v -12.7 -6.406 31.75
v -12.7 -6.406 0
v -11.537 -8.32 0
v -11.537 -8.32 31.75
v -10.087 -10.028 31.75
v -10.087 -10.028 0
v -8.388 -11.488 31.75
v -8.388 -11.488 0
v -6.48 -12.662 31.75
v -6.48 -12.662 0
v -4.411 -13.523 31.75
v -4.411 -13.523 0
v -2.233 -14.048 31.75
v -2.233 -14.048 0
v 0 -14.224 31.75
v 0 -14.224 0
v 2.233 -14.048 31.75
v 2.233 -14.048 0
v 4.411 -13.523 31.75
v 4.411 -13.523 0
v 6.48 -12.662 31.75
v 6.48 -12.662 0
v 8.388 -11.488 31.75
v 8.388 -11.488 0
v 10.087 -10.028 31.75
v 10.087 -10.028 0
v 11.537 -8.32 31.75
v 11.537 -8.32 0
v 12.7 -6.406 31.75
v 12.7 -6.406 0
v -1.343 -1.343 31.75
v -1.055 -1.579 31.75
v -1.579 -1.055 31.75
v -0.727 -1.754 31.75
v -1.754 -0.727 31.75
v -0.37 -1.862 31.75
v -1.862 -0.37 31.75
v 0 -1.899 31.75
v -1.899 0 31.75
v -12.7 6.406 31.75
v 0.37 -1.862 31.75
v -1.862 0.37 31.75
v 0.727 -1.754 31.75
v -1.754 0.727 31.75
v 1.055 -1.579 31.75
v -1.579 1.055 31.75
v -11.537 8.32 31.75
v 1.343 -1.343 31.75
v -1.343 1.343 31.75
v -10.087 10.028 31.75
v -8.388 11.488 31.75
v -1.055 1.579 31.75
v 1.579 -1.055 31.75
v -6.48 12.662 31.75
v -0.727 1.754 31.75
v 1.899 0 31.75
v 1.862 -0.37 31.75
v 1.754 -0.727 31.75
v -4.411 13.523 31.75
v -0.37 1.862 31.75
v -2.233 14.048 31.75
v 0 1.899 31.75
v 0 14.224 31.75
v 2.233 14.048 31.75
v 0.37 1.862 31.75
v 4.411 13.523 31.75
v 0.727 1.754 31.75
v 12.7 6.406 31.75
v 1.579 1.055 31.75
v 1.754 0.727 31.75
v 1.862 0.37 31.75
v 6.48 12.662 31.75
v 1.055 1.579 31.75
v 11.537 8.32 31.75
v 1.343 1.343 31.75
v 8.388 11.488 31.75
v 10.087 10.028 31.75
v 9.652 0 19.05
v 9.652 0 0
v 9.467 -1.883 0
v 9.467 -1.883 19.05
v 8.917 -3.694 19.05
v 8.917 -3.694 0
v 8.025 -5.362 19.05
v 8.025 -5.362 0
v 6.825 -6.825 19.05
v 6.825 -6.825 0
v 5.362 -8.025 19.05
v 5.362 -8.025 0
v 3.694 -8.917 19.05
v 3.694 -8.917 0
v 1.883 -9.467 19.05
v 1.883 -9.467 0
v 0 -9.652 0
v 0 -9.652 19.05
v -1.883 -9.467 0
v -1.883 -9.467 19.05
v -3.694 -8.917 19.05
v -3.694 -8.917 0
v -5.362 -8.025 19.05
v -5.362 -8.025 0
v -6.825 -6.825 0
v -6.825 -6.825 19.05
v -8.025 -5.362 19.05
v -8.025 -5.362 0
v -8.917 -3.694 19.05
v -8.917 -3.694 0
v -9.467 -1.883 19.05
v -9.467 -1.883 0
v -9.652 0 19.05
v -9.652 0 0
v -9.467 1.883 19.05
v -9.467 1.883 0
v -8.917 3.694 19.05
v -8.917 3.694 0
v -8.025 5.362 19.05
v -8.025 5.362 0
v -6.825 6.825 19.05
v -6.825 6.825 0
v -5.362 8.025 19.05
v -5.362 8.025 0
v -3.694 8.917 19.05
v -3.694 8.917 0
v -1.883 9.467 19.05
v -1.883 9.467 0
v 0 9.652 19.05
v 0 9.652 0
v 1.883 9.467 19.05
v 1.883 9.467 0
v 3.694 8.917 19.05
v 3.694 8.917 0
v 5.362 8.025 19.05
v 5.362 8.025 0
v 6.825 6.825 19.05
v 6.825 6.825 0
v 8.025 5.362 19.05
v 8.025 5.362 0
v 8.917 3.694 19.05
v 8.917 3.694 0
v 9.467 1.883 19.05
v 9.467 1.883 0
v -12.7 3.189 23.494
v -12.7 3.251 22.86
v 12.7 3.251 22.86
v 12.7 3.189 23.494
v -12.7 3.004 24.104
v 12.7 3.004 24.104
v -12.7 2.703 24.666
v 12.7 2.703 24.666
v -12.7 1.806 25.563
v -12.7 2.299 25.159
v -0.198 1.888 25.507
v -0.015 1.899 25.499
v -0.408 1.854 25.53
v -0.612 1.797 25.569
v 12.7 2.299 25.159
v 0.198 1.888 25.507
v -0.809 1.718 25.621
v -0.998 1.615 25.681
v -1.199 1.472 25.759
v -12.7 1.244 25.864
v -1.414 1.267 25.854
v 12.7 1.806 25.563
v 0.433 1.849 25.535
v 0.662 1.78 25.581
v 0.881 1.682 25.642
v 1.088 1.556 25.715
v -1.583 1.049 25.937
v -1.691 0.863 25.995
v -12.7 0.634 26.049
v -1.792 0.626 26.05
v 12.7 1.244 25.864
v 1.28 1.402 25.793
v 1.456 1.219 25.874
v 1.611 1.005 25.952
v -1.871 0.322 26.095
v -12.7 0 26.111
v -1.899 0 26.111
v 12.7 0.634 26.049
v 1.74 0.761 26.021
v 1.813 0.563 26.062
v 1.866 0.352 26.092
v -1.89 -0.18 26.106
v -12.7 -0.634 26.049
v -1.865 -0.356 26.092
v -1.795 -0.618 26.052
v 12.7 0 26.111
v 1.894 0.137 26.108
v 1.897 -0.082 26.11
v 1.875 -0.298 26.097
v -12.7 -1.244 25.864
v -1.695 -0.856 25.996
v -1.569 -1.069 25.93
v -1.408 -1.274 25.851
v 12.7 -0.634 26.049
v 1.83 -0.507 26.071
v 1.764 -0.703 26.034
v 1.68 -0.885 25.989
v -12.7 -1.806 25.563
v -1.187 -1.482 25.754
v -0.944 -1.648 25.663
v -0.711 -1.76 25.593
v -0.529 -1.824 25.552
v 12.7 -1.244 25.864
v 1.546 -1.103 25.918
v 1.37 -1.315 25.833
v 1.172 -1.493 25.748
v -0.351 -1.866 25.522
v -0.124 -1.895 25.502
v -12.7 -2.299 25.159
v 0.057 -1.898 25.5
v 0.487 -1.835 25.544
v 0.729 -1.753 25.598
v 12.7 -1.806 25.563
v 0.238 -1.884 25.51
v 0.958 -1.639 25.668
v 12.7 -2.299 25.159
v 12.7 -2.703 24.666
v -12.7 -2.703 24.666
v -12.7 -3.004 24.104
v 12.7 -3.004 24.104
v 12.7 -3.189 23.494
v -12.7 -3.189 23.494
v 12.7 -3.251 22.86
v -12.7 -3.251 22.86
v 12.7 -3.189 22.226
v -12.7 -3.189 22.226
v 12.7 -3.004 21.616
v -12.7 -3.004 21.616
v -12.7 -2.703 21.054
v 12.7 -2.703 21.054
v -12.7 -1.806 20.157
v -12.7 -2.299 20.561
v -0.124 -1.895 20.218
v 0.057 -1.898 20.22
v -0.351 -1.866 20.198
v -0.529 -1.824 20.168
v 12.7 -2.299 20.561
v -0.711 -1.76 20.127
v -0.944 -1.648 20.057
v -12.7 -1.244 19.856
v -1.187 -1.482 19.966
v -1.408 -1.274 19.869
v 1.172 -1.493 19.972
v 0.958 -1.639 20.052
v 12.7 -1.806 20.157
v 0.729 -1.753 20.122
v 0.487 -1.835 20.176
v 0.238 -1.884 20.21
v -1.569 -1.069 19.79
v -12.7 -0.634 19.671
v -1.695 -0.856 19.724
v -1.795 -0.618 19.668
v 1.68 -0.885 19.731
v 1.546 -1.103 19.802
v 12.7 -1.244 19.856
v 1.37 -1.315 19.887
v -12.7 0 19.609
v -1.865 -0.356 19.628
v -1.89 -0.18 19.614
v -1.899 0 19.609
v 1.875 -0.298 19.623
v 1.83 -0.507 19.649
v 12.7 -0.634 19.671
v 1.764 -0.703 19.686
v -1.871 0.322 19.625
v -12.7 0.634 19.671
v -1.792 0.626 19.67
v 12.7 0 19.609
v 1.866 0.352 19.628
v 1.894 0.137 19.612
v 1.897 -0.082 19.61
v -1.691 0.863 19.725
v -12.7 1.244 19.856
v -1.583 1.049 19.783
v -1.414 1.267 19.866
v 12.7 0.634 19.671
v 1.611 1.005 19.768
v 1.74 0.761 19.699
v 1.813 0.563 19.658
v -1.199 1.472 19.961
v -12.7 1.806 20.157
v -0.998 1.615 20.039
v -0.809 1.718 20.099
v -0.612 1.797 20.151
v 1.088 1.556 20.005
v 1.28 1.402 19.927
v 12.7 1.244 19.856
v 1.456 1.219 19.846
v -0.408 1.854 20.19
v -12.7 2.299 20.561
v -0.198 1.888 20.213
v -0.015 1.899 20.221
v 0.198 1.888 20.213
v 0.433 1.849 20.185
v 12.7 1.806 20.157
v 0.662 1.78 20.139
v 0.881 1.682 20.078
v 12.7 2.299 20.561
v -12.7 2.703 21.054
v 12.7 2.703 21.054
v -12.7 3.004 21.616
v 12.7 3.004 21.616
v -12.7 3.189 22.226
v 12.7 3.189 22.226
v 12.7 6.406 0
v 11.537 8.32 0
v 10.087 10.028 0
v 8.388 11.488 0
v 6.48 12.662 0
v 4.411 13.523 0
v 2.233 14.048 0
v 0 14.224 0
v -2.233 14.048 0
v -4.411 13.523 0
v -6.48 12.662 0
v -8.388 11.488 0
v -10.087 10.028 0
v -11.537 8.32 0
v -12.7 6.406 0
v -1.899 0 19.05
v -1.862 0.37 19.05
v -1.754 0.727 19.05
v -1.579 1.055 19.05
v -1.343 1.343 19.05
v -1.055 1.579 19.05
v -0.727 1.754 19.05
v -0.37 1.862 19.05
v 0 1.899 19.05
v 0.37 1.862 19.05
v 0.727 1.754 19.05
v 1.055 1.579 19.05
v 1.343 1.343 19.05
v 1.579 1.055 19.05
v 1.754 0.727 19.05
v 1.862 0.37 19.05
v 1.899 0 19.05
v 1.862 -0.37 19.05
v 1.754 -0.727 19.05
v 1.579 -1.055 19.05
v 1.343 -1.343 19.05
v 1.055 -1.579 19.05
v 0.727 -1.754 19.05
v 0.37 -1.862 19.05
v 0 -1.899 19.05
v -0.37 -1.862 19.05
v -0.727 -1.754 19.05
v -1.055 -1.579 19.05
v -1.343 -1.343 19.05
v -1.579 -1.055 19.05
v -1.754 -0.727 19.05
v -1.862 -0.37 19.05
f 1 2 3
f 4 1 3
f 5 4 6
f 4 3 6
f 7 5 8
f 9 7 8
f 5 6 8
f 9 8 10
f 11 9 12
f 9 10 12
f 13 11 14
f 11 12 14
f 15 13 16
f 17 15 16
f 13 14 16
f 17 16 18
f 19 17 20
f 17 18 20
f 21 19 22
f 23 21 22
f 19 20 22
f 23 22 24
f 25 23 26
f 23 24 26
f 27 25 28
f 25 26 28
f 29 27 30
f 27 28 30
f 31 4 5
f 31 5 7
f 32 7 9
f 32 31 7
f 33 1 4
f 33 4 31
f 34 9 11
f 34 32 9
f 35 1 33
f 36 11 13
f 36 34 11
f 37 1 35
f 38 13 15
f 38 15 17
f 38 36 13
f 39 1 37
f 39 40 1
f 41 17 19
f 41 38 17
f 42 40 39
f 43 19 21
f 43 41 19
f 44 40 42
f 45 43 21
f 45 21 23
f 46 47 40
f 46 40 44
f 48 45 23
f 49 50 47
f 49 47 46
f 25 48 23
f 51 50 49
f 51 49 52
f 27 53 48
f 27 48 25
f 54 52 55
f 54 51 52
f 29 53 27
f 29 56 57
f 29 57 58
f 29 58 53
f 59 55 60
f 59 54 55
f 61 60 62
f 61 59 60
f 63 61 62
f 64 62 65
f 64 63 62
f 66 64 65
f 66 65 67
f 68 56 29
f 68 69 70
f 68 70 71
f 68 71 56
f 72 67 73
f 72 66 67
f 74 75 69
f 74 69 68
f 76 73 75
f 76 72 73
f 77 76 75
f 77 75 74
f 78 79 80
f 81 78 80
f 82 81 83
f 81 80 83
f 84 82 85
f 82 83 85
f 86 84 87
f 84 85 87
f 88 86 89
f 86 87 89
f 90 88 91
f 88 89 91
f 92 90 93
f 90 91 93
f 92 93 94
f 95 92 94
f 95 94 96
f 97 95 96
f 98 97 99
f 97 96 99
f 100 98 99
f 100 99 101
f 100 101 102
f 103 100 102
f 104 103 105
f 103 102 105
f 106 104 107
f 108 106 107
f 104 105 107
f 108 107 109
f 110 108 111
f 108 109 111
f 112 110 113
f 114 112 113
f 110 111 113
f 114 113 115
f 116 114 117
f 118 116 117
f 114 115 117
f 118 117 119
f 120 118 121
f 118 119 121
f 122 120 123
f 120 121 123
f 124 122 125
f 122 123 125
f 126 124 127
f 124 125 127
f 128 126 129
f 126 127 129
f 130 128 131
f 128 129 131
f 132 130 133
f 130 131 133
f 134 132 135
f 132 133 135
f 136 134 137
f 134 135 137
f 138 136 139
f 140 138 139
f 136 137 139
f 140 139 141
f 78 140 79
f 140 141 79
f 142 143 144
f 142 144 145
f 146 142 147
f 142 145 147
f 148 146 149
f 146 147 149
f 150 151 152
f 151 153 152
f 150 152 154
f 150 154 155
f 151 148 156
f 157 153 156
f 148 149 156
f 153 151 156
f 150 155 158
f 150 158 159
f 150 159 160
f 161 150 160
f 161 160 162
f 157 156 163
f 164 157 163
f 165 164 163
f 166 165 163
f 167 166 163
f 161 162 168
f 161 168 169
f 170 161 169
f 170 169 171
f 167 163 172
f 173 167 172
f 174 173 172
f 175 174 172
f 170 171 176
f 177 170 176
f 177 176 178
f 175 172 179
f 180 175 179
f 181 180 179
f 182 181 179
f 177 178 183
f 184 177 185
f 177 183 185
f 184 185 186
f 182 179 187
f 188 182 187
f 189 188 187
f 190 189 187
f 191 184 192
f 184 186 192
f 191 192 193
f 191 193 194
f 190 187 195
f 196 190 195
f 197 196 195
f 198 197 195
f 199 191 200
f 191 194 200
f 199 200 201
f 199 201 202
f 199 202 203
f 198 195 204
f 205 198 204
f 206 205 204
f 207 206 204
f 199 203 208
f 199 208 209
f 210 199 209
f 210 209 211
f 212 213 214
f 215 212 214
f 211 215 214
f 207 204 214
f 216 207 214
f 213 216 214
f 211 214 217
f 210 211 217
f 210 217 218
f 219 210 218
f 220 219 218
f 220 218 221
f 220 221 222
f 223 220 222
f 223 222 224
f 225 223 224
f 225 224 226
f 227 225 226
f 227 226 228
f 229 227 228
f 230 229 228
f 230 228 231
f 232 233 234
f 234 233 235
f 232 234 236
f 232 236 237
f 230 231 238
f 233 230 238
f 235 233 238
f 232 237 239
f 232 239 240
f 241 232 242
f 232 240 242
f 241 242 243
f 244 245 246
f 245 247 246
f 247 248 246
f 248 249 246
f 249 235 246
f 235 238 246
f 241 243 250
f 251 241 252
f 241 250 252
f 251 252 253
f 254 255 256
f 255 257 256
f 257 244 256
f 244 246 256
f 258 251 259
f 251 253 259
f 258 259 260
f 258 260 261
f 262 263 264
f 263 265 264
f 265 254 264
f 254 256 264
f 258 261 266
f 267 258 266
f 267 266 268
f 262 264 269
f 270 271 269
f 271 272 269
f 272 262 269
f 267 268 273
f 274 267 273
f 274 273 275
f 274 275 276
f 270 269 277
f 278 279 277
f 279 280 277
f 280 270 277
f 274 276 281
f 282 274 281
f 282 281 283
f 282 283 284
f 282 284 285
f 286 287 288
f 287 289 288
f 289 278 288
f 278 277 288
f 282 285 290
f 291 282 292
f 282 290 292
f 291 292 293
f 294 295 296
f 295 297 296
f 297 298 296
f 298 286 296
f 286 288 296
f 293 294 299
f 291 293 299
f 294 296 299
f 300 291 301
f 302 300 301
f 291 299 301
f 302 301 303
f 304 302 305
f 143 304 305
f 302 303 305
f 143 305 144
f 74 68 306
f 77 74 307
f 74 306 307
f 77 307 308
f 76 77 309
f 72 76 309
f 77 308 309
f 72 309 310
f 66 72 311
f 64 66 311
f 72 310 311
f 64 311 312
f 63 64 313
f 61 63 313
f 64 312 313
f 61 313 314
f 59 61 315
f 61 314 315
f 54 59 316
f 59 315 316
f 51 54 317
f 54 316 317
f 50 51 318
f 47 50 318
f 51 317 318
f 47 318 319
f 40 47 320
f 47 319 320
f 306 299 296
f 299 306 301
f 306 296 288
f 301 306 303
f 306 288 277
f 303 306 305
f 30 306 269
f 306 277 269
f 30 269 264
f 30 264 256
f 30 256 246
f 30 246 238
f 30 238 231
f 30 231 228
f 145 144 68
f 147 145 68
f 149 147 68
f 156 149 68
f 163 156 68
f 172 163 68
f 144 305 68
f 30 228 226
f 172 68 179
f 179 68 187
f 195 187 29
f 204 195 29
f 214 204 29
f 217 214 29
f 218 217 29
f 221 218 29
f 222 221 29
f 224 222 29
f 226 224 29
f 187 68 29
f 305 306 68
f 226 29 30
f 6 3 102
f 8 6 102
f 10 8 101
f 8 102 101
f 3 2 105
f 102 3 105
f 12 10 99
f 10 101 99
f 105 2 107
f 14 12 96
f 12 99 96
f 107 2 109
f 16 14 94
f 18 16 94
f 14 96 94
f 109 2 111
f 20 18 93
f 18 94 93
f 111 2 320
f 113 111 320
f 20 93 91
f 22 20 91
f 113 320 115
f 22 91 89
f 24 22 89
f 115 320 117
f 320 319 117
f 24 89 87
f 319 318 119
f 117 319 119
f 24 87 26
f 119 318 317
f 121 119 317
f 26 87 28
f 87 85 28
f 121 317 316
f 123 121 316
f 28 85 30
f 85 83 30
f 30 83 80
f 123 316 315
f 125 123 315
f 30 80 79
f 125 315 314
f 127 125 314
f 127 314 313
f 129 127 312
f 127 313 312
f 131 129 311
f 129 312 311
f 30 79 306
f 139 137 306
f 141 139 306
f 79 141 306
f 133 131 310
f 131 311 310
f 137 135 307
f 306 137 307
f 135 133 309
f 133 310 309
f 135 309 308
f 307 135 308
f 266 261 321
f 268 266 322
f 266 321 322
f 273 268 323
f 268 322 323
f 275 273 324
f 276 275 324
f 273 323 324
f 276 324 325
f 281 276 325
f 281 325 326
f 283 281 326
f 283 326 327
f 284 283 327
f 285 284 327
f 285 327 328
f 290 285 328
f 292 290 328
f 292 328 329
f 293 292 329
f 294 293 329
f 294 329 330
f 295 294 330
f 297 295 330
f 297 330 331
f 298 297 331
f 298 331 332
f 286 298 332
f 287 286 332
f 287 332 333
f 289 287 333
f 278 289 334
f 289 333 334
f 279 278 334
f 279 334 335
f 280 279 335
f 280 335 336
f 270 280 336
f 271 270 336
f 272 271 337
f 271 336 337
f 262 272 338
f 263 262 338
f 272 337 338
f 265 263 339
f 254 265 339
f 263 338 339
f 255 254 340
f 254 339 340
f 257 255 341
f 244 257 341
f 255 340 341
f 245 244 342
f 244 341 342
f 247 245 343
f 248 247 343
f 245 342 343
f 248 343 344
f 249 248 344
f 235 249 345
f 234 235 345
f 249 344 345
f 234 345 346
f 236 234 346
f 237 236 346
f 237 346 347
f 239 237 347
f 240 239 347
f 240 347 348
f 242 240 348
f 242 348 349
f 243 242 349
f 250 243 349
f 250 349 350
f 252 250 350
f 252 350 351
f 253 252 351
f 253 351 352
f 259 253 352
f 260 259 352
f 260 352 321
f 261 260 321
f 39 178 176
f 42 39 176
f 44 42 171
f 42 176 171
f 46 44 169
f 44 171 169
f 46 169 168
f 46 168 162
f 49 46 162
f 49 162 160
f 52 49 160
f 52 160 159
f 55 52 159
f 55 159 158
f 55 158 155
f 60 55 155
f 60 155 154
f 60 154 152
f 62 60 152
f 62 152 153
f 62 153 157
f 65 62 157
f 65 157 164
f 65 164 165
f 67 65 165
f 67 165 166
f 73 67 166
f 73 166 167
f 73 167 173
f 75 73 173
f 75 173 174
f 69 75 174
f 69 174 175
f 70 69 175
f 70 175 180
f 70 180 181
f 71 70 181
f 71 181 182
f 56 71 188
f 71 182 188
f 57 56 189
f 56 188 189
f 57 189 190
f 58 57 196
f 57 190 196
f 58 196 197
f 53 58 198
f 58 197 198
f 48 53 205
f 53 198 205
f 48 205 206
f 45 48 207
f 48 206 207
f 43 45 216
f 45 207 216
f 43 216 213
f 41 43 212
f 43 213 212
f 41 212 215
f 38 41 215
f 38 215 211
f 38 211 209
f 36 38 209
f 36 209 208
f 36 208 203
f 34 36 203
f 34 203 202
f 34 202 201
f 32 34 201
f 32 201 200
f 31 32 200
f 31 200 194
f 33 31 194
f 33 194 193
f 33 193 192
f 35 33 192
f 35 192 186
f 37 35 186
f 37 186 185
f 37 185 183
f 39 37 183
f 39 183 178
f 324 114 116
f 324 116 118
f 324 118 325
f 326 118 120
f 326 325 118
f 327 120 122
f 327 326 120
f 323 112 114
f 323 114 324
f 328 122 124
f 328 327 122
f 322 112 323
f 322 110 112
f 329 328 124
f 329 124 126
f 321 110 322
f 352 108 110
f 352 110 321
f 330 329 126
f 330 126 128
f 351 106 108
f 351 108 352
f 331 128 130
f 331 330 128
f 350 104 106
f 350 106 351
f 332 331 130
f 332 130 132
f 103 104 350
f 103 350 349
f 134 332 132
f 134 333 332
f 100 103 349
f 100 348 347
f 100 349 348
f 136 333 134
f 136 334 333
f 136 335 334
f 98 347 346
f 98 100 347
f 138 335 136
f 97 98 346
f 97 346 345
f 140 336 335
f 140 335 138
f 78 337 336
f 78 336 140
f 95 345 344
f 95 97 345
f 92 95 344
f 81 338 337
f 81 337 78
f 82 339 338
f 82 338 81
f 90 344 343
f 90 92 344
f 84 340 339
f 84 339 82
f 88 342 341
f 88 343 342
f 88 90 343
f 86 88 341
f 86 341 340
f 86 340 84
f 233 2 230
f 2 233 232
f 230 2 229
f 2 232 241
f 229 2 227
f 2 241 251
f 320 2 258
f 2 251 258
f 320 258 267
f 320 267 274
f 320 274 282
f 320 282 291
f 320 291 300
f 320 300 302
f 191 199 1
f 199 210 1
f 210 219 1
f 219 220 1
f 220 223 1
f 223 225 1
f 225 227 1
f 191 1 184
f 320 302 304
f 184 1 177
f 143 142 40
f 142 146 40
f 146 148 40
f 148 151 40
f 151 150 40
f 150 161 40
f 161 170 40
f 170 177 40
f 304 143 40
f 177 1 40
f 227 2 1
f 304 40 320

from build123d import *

# Parameters (mm, degrees)
F0_R     = 14.224
F1_DEPTH = 31.75
F2_R     = 9.652
F3_DEPTH = 19.05
F5_D     = 3.7973
F7_DEPTH = 31.75
F8_R     = 3.2512
F9_DEPTH = 25.401


with BuildPart() as f1:
    # F0 (on Top) → F1 (new body)
    with BuildSketch(Plane.XY):
        Circle(F0_R)
    extrude(amount=F1_DEPTH)

    # F2 (on face) → F3 (cut)
    with BuildSketch(Plane(origin=(0, 0, 0), x_dir=(1, 0, 0), z_dir=(0, 0, -1))):
        Circle(F2_R)
    extrude(amount=-F3_DEPTH, mode=Mode.SUBTRACT)

    # F5 (through all)
    with Locations(Plane.XY.offset(31.75)):
        with Locations((0, 0)):
            Hole(F5_D / 2)

    # F6 (on face) → F7 (cut, through all)
    with BuildSketch(Plane.XY.offset(31.75)):
        with BuildLine():
            Line((-12.7, -6.4056362682), (-12.7, 6.4056362682))
            ThreePointArc((-12.7, 6.4056362682), (-14.224, 0), (-12.7, -6.4056362682))
        make_face()
        with BuildLine():
            ThreePointArc((12.7, -6.4056362682), (14.224, 0), (12.7, 6.4056362682))
            Line((12.7, 6.4056362682), (12.7, -6.4056362682))
        make_face()
    extrude(amount=-F7_DEPTH, mode=Mode.SUBTRACT)

    # F8 (on face) → F9 (cut, through all)
    with BuildSketch(Plane.YZ.offset(12.7)):
        with Locations((0, 22.86)):
            Circle(F8_R)
    extrude(amount=-F9_DEPTH, mode=Mode.SUBTRACT)


solid = f1.part
